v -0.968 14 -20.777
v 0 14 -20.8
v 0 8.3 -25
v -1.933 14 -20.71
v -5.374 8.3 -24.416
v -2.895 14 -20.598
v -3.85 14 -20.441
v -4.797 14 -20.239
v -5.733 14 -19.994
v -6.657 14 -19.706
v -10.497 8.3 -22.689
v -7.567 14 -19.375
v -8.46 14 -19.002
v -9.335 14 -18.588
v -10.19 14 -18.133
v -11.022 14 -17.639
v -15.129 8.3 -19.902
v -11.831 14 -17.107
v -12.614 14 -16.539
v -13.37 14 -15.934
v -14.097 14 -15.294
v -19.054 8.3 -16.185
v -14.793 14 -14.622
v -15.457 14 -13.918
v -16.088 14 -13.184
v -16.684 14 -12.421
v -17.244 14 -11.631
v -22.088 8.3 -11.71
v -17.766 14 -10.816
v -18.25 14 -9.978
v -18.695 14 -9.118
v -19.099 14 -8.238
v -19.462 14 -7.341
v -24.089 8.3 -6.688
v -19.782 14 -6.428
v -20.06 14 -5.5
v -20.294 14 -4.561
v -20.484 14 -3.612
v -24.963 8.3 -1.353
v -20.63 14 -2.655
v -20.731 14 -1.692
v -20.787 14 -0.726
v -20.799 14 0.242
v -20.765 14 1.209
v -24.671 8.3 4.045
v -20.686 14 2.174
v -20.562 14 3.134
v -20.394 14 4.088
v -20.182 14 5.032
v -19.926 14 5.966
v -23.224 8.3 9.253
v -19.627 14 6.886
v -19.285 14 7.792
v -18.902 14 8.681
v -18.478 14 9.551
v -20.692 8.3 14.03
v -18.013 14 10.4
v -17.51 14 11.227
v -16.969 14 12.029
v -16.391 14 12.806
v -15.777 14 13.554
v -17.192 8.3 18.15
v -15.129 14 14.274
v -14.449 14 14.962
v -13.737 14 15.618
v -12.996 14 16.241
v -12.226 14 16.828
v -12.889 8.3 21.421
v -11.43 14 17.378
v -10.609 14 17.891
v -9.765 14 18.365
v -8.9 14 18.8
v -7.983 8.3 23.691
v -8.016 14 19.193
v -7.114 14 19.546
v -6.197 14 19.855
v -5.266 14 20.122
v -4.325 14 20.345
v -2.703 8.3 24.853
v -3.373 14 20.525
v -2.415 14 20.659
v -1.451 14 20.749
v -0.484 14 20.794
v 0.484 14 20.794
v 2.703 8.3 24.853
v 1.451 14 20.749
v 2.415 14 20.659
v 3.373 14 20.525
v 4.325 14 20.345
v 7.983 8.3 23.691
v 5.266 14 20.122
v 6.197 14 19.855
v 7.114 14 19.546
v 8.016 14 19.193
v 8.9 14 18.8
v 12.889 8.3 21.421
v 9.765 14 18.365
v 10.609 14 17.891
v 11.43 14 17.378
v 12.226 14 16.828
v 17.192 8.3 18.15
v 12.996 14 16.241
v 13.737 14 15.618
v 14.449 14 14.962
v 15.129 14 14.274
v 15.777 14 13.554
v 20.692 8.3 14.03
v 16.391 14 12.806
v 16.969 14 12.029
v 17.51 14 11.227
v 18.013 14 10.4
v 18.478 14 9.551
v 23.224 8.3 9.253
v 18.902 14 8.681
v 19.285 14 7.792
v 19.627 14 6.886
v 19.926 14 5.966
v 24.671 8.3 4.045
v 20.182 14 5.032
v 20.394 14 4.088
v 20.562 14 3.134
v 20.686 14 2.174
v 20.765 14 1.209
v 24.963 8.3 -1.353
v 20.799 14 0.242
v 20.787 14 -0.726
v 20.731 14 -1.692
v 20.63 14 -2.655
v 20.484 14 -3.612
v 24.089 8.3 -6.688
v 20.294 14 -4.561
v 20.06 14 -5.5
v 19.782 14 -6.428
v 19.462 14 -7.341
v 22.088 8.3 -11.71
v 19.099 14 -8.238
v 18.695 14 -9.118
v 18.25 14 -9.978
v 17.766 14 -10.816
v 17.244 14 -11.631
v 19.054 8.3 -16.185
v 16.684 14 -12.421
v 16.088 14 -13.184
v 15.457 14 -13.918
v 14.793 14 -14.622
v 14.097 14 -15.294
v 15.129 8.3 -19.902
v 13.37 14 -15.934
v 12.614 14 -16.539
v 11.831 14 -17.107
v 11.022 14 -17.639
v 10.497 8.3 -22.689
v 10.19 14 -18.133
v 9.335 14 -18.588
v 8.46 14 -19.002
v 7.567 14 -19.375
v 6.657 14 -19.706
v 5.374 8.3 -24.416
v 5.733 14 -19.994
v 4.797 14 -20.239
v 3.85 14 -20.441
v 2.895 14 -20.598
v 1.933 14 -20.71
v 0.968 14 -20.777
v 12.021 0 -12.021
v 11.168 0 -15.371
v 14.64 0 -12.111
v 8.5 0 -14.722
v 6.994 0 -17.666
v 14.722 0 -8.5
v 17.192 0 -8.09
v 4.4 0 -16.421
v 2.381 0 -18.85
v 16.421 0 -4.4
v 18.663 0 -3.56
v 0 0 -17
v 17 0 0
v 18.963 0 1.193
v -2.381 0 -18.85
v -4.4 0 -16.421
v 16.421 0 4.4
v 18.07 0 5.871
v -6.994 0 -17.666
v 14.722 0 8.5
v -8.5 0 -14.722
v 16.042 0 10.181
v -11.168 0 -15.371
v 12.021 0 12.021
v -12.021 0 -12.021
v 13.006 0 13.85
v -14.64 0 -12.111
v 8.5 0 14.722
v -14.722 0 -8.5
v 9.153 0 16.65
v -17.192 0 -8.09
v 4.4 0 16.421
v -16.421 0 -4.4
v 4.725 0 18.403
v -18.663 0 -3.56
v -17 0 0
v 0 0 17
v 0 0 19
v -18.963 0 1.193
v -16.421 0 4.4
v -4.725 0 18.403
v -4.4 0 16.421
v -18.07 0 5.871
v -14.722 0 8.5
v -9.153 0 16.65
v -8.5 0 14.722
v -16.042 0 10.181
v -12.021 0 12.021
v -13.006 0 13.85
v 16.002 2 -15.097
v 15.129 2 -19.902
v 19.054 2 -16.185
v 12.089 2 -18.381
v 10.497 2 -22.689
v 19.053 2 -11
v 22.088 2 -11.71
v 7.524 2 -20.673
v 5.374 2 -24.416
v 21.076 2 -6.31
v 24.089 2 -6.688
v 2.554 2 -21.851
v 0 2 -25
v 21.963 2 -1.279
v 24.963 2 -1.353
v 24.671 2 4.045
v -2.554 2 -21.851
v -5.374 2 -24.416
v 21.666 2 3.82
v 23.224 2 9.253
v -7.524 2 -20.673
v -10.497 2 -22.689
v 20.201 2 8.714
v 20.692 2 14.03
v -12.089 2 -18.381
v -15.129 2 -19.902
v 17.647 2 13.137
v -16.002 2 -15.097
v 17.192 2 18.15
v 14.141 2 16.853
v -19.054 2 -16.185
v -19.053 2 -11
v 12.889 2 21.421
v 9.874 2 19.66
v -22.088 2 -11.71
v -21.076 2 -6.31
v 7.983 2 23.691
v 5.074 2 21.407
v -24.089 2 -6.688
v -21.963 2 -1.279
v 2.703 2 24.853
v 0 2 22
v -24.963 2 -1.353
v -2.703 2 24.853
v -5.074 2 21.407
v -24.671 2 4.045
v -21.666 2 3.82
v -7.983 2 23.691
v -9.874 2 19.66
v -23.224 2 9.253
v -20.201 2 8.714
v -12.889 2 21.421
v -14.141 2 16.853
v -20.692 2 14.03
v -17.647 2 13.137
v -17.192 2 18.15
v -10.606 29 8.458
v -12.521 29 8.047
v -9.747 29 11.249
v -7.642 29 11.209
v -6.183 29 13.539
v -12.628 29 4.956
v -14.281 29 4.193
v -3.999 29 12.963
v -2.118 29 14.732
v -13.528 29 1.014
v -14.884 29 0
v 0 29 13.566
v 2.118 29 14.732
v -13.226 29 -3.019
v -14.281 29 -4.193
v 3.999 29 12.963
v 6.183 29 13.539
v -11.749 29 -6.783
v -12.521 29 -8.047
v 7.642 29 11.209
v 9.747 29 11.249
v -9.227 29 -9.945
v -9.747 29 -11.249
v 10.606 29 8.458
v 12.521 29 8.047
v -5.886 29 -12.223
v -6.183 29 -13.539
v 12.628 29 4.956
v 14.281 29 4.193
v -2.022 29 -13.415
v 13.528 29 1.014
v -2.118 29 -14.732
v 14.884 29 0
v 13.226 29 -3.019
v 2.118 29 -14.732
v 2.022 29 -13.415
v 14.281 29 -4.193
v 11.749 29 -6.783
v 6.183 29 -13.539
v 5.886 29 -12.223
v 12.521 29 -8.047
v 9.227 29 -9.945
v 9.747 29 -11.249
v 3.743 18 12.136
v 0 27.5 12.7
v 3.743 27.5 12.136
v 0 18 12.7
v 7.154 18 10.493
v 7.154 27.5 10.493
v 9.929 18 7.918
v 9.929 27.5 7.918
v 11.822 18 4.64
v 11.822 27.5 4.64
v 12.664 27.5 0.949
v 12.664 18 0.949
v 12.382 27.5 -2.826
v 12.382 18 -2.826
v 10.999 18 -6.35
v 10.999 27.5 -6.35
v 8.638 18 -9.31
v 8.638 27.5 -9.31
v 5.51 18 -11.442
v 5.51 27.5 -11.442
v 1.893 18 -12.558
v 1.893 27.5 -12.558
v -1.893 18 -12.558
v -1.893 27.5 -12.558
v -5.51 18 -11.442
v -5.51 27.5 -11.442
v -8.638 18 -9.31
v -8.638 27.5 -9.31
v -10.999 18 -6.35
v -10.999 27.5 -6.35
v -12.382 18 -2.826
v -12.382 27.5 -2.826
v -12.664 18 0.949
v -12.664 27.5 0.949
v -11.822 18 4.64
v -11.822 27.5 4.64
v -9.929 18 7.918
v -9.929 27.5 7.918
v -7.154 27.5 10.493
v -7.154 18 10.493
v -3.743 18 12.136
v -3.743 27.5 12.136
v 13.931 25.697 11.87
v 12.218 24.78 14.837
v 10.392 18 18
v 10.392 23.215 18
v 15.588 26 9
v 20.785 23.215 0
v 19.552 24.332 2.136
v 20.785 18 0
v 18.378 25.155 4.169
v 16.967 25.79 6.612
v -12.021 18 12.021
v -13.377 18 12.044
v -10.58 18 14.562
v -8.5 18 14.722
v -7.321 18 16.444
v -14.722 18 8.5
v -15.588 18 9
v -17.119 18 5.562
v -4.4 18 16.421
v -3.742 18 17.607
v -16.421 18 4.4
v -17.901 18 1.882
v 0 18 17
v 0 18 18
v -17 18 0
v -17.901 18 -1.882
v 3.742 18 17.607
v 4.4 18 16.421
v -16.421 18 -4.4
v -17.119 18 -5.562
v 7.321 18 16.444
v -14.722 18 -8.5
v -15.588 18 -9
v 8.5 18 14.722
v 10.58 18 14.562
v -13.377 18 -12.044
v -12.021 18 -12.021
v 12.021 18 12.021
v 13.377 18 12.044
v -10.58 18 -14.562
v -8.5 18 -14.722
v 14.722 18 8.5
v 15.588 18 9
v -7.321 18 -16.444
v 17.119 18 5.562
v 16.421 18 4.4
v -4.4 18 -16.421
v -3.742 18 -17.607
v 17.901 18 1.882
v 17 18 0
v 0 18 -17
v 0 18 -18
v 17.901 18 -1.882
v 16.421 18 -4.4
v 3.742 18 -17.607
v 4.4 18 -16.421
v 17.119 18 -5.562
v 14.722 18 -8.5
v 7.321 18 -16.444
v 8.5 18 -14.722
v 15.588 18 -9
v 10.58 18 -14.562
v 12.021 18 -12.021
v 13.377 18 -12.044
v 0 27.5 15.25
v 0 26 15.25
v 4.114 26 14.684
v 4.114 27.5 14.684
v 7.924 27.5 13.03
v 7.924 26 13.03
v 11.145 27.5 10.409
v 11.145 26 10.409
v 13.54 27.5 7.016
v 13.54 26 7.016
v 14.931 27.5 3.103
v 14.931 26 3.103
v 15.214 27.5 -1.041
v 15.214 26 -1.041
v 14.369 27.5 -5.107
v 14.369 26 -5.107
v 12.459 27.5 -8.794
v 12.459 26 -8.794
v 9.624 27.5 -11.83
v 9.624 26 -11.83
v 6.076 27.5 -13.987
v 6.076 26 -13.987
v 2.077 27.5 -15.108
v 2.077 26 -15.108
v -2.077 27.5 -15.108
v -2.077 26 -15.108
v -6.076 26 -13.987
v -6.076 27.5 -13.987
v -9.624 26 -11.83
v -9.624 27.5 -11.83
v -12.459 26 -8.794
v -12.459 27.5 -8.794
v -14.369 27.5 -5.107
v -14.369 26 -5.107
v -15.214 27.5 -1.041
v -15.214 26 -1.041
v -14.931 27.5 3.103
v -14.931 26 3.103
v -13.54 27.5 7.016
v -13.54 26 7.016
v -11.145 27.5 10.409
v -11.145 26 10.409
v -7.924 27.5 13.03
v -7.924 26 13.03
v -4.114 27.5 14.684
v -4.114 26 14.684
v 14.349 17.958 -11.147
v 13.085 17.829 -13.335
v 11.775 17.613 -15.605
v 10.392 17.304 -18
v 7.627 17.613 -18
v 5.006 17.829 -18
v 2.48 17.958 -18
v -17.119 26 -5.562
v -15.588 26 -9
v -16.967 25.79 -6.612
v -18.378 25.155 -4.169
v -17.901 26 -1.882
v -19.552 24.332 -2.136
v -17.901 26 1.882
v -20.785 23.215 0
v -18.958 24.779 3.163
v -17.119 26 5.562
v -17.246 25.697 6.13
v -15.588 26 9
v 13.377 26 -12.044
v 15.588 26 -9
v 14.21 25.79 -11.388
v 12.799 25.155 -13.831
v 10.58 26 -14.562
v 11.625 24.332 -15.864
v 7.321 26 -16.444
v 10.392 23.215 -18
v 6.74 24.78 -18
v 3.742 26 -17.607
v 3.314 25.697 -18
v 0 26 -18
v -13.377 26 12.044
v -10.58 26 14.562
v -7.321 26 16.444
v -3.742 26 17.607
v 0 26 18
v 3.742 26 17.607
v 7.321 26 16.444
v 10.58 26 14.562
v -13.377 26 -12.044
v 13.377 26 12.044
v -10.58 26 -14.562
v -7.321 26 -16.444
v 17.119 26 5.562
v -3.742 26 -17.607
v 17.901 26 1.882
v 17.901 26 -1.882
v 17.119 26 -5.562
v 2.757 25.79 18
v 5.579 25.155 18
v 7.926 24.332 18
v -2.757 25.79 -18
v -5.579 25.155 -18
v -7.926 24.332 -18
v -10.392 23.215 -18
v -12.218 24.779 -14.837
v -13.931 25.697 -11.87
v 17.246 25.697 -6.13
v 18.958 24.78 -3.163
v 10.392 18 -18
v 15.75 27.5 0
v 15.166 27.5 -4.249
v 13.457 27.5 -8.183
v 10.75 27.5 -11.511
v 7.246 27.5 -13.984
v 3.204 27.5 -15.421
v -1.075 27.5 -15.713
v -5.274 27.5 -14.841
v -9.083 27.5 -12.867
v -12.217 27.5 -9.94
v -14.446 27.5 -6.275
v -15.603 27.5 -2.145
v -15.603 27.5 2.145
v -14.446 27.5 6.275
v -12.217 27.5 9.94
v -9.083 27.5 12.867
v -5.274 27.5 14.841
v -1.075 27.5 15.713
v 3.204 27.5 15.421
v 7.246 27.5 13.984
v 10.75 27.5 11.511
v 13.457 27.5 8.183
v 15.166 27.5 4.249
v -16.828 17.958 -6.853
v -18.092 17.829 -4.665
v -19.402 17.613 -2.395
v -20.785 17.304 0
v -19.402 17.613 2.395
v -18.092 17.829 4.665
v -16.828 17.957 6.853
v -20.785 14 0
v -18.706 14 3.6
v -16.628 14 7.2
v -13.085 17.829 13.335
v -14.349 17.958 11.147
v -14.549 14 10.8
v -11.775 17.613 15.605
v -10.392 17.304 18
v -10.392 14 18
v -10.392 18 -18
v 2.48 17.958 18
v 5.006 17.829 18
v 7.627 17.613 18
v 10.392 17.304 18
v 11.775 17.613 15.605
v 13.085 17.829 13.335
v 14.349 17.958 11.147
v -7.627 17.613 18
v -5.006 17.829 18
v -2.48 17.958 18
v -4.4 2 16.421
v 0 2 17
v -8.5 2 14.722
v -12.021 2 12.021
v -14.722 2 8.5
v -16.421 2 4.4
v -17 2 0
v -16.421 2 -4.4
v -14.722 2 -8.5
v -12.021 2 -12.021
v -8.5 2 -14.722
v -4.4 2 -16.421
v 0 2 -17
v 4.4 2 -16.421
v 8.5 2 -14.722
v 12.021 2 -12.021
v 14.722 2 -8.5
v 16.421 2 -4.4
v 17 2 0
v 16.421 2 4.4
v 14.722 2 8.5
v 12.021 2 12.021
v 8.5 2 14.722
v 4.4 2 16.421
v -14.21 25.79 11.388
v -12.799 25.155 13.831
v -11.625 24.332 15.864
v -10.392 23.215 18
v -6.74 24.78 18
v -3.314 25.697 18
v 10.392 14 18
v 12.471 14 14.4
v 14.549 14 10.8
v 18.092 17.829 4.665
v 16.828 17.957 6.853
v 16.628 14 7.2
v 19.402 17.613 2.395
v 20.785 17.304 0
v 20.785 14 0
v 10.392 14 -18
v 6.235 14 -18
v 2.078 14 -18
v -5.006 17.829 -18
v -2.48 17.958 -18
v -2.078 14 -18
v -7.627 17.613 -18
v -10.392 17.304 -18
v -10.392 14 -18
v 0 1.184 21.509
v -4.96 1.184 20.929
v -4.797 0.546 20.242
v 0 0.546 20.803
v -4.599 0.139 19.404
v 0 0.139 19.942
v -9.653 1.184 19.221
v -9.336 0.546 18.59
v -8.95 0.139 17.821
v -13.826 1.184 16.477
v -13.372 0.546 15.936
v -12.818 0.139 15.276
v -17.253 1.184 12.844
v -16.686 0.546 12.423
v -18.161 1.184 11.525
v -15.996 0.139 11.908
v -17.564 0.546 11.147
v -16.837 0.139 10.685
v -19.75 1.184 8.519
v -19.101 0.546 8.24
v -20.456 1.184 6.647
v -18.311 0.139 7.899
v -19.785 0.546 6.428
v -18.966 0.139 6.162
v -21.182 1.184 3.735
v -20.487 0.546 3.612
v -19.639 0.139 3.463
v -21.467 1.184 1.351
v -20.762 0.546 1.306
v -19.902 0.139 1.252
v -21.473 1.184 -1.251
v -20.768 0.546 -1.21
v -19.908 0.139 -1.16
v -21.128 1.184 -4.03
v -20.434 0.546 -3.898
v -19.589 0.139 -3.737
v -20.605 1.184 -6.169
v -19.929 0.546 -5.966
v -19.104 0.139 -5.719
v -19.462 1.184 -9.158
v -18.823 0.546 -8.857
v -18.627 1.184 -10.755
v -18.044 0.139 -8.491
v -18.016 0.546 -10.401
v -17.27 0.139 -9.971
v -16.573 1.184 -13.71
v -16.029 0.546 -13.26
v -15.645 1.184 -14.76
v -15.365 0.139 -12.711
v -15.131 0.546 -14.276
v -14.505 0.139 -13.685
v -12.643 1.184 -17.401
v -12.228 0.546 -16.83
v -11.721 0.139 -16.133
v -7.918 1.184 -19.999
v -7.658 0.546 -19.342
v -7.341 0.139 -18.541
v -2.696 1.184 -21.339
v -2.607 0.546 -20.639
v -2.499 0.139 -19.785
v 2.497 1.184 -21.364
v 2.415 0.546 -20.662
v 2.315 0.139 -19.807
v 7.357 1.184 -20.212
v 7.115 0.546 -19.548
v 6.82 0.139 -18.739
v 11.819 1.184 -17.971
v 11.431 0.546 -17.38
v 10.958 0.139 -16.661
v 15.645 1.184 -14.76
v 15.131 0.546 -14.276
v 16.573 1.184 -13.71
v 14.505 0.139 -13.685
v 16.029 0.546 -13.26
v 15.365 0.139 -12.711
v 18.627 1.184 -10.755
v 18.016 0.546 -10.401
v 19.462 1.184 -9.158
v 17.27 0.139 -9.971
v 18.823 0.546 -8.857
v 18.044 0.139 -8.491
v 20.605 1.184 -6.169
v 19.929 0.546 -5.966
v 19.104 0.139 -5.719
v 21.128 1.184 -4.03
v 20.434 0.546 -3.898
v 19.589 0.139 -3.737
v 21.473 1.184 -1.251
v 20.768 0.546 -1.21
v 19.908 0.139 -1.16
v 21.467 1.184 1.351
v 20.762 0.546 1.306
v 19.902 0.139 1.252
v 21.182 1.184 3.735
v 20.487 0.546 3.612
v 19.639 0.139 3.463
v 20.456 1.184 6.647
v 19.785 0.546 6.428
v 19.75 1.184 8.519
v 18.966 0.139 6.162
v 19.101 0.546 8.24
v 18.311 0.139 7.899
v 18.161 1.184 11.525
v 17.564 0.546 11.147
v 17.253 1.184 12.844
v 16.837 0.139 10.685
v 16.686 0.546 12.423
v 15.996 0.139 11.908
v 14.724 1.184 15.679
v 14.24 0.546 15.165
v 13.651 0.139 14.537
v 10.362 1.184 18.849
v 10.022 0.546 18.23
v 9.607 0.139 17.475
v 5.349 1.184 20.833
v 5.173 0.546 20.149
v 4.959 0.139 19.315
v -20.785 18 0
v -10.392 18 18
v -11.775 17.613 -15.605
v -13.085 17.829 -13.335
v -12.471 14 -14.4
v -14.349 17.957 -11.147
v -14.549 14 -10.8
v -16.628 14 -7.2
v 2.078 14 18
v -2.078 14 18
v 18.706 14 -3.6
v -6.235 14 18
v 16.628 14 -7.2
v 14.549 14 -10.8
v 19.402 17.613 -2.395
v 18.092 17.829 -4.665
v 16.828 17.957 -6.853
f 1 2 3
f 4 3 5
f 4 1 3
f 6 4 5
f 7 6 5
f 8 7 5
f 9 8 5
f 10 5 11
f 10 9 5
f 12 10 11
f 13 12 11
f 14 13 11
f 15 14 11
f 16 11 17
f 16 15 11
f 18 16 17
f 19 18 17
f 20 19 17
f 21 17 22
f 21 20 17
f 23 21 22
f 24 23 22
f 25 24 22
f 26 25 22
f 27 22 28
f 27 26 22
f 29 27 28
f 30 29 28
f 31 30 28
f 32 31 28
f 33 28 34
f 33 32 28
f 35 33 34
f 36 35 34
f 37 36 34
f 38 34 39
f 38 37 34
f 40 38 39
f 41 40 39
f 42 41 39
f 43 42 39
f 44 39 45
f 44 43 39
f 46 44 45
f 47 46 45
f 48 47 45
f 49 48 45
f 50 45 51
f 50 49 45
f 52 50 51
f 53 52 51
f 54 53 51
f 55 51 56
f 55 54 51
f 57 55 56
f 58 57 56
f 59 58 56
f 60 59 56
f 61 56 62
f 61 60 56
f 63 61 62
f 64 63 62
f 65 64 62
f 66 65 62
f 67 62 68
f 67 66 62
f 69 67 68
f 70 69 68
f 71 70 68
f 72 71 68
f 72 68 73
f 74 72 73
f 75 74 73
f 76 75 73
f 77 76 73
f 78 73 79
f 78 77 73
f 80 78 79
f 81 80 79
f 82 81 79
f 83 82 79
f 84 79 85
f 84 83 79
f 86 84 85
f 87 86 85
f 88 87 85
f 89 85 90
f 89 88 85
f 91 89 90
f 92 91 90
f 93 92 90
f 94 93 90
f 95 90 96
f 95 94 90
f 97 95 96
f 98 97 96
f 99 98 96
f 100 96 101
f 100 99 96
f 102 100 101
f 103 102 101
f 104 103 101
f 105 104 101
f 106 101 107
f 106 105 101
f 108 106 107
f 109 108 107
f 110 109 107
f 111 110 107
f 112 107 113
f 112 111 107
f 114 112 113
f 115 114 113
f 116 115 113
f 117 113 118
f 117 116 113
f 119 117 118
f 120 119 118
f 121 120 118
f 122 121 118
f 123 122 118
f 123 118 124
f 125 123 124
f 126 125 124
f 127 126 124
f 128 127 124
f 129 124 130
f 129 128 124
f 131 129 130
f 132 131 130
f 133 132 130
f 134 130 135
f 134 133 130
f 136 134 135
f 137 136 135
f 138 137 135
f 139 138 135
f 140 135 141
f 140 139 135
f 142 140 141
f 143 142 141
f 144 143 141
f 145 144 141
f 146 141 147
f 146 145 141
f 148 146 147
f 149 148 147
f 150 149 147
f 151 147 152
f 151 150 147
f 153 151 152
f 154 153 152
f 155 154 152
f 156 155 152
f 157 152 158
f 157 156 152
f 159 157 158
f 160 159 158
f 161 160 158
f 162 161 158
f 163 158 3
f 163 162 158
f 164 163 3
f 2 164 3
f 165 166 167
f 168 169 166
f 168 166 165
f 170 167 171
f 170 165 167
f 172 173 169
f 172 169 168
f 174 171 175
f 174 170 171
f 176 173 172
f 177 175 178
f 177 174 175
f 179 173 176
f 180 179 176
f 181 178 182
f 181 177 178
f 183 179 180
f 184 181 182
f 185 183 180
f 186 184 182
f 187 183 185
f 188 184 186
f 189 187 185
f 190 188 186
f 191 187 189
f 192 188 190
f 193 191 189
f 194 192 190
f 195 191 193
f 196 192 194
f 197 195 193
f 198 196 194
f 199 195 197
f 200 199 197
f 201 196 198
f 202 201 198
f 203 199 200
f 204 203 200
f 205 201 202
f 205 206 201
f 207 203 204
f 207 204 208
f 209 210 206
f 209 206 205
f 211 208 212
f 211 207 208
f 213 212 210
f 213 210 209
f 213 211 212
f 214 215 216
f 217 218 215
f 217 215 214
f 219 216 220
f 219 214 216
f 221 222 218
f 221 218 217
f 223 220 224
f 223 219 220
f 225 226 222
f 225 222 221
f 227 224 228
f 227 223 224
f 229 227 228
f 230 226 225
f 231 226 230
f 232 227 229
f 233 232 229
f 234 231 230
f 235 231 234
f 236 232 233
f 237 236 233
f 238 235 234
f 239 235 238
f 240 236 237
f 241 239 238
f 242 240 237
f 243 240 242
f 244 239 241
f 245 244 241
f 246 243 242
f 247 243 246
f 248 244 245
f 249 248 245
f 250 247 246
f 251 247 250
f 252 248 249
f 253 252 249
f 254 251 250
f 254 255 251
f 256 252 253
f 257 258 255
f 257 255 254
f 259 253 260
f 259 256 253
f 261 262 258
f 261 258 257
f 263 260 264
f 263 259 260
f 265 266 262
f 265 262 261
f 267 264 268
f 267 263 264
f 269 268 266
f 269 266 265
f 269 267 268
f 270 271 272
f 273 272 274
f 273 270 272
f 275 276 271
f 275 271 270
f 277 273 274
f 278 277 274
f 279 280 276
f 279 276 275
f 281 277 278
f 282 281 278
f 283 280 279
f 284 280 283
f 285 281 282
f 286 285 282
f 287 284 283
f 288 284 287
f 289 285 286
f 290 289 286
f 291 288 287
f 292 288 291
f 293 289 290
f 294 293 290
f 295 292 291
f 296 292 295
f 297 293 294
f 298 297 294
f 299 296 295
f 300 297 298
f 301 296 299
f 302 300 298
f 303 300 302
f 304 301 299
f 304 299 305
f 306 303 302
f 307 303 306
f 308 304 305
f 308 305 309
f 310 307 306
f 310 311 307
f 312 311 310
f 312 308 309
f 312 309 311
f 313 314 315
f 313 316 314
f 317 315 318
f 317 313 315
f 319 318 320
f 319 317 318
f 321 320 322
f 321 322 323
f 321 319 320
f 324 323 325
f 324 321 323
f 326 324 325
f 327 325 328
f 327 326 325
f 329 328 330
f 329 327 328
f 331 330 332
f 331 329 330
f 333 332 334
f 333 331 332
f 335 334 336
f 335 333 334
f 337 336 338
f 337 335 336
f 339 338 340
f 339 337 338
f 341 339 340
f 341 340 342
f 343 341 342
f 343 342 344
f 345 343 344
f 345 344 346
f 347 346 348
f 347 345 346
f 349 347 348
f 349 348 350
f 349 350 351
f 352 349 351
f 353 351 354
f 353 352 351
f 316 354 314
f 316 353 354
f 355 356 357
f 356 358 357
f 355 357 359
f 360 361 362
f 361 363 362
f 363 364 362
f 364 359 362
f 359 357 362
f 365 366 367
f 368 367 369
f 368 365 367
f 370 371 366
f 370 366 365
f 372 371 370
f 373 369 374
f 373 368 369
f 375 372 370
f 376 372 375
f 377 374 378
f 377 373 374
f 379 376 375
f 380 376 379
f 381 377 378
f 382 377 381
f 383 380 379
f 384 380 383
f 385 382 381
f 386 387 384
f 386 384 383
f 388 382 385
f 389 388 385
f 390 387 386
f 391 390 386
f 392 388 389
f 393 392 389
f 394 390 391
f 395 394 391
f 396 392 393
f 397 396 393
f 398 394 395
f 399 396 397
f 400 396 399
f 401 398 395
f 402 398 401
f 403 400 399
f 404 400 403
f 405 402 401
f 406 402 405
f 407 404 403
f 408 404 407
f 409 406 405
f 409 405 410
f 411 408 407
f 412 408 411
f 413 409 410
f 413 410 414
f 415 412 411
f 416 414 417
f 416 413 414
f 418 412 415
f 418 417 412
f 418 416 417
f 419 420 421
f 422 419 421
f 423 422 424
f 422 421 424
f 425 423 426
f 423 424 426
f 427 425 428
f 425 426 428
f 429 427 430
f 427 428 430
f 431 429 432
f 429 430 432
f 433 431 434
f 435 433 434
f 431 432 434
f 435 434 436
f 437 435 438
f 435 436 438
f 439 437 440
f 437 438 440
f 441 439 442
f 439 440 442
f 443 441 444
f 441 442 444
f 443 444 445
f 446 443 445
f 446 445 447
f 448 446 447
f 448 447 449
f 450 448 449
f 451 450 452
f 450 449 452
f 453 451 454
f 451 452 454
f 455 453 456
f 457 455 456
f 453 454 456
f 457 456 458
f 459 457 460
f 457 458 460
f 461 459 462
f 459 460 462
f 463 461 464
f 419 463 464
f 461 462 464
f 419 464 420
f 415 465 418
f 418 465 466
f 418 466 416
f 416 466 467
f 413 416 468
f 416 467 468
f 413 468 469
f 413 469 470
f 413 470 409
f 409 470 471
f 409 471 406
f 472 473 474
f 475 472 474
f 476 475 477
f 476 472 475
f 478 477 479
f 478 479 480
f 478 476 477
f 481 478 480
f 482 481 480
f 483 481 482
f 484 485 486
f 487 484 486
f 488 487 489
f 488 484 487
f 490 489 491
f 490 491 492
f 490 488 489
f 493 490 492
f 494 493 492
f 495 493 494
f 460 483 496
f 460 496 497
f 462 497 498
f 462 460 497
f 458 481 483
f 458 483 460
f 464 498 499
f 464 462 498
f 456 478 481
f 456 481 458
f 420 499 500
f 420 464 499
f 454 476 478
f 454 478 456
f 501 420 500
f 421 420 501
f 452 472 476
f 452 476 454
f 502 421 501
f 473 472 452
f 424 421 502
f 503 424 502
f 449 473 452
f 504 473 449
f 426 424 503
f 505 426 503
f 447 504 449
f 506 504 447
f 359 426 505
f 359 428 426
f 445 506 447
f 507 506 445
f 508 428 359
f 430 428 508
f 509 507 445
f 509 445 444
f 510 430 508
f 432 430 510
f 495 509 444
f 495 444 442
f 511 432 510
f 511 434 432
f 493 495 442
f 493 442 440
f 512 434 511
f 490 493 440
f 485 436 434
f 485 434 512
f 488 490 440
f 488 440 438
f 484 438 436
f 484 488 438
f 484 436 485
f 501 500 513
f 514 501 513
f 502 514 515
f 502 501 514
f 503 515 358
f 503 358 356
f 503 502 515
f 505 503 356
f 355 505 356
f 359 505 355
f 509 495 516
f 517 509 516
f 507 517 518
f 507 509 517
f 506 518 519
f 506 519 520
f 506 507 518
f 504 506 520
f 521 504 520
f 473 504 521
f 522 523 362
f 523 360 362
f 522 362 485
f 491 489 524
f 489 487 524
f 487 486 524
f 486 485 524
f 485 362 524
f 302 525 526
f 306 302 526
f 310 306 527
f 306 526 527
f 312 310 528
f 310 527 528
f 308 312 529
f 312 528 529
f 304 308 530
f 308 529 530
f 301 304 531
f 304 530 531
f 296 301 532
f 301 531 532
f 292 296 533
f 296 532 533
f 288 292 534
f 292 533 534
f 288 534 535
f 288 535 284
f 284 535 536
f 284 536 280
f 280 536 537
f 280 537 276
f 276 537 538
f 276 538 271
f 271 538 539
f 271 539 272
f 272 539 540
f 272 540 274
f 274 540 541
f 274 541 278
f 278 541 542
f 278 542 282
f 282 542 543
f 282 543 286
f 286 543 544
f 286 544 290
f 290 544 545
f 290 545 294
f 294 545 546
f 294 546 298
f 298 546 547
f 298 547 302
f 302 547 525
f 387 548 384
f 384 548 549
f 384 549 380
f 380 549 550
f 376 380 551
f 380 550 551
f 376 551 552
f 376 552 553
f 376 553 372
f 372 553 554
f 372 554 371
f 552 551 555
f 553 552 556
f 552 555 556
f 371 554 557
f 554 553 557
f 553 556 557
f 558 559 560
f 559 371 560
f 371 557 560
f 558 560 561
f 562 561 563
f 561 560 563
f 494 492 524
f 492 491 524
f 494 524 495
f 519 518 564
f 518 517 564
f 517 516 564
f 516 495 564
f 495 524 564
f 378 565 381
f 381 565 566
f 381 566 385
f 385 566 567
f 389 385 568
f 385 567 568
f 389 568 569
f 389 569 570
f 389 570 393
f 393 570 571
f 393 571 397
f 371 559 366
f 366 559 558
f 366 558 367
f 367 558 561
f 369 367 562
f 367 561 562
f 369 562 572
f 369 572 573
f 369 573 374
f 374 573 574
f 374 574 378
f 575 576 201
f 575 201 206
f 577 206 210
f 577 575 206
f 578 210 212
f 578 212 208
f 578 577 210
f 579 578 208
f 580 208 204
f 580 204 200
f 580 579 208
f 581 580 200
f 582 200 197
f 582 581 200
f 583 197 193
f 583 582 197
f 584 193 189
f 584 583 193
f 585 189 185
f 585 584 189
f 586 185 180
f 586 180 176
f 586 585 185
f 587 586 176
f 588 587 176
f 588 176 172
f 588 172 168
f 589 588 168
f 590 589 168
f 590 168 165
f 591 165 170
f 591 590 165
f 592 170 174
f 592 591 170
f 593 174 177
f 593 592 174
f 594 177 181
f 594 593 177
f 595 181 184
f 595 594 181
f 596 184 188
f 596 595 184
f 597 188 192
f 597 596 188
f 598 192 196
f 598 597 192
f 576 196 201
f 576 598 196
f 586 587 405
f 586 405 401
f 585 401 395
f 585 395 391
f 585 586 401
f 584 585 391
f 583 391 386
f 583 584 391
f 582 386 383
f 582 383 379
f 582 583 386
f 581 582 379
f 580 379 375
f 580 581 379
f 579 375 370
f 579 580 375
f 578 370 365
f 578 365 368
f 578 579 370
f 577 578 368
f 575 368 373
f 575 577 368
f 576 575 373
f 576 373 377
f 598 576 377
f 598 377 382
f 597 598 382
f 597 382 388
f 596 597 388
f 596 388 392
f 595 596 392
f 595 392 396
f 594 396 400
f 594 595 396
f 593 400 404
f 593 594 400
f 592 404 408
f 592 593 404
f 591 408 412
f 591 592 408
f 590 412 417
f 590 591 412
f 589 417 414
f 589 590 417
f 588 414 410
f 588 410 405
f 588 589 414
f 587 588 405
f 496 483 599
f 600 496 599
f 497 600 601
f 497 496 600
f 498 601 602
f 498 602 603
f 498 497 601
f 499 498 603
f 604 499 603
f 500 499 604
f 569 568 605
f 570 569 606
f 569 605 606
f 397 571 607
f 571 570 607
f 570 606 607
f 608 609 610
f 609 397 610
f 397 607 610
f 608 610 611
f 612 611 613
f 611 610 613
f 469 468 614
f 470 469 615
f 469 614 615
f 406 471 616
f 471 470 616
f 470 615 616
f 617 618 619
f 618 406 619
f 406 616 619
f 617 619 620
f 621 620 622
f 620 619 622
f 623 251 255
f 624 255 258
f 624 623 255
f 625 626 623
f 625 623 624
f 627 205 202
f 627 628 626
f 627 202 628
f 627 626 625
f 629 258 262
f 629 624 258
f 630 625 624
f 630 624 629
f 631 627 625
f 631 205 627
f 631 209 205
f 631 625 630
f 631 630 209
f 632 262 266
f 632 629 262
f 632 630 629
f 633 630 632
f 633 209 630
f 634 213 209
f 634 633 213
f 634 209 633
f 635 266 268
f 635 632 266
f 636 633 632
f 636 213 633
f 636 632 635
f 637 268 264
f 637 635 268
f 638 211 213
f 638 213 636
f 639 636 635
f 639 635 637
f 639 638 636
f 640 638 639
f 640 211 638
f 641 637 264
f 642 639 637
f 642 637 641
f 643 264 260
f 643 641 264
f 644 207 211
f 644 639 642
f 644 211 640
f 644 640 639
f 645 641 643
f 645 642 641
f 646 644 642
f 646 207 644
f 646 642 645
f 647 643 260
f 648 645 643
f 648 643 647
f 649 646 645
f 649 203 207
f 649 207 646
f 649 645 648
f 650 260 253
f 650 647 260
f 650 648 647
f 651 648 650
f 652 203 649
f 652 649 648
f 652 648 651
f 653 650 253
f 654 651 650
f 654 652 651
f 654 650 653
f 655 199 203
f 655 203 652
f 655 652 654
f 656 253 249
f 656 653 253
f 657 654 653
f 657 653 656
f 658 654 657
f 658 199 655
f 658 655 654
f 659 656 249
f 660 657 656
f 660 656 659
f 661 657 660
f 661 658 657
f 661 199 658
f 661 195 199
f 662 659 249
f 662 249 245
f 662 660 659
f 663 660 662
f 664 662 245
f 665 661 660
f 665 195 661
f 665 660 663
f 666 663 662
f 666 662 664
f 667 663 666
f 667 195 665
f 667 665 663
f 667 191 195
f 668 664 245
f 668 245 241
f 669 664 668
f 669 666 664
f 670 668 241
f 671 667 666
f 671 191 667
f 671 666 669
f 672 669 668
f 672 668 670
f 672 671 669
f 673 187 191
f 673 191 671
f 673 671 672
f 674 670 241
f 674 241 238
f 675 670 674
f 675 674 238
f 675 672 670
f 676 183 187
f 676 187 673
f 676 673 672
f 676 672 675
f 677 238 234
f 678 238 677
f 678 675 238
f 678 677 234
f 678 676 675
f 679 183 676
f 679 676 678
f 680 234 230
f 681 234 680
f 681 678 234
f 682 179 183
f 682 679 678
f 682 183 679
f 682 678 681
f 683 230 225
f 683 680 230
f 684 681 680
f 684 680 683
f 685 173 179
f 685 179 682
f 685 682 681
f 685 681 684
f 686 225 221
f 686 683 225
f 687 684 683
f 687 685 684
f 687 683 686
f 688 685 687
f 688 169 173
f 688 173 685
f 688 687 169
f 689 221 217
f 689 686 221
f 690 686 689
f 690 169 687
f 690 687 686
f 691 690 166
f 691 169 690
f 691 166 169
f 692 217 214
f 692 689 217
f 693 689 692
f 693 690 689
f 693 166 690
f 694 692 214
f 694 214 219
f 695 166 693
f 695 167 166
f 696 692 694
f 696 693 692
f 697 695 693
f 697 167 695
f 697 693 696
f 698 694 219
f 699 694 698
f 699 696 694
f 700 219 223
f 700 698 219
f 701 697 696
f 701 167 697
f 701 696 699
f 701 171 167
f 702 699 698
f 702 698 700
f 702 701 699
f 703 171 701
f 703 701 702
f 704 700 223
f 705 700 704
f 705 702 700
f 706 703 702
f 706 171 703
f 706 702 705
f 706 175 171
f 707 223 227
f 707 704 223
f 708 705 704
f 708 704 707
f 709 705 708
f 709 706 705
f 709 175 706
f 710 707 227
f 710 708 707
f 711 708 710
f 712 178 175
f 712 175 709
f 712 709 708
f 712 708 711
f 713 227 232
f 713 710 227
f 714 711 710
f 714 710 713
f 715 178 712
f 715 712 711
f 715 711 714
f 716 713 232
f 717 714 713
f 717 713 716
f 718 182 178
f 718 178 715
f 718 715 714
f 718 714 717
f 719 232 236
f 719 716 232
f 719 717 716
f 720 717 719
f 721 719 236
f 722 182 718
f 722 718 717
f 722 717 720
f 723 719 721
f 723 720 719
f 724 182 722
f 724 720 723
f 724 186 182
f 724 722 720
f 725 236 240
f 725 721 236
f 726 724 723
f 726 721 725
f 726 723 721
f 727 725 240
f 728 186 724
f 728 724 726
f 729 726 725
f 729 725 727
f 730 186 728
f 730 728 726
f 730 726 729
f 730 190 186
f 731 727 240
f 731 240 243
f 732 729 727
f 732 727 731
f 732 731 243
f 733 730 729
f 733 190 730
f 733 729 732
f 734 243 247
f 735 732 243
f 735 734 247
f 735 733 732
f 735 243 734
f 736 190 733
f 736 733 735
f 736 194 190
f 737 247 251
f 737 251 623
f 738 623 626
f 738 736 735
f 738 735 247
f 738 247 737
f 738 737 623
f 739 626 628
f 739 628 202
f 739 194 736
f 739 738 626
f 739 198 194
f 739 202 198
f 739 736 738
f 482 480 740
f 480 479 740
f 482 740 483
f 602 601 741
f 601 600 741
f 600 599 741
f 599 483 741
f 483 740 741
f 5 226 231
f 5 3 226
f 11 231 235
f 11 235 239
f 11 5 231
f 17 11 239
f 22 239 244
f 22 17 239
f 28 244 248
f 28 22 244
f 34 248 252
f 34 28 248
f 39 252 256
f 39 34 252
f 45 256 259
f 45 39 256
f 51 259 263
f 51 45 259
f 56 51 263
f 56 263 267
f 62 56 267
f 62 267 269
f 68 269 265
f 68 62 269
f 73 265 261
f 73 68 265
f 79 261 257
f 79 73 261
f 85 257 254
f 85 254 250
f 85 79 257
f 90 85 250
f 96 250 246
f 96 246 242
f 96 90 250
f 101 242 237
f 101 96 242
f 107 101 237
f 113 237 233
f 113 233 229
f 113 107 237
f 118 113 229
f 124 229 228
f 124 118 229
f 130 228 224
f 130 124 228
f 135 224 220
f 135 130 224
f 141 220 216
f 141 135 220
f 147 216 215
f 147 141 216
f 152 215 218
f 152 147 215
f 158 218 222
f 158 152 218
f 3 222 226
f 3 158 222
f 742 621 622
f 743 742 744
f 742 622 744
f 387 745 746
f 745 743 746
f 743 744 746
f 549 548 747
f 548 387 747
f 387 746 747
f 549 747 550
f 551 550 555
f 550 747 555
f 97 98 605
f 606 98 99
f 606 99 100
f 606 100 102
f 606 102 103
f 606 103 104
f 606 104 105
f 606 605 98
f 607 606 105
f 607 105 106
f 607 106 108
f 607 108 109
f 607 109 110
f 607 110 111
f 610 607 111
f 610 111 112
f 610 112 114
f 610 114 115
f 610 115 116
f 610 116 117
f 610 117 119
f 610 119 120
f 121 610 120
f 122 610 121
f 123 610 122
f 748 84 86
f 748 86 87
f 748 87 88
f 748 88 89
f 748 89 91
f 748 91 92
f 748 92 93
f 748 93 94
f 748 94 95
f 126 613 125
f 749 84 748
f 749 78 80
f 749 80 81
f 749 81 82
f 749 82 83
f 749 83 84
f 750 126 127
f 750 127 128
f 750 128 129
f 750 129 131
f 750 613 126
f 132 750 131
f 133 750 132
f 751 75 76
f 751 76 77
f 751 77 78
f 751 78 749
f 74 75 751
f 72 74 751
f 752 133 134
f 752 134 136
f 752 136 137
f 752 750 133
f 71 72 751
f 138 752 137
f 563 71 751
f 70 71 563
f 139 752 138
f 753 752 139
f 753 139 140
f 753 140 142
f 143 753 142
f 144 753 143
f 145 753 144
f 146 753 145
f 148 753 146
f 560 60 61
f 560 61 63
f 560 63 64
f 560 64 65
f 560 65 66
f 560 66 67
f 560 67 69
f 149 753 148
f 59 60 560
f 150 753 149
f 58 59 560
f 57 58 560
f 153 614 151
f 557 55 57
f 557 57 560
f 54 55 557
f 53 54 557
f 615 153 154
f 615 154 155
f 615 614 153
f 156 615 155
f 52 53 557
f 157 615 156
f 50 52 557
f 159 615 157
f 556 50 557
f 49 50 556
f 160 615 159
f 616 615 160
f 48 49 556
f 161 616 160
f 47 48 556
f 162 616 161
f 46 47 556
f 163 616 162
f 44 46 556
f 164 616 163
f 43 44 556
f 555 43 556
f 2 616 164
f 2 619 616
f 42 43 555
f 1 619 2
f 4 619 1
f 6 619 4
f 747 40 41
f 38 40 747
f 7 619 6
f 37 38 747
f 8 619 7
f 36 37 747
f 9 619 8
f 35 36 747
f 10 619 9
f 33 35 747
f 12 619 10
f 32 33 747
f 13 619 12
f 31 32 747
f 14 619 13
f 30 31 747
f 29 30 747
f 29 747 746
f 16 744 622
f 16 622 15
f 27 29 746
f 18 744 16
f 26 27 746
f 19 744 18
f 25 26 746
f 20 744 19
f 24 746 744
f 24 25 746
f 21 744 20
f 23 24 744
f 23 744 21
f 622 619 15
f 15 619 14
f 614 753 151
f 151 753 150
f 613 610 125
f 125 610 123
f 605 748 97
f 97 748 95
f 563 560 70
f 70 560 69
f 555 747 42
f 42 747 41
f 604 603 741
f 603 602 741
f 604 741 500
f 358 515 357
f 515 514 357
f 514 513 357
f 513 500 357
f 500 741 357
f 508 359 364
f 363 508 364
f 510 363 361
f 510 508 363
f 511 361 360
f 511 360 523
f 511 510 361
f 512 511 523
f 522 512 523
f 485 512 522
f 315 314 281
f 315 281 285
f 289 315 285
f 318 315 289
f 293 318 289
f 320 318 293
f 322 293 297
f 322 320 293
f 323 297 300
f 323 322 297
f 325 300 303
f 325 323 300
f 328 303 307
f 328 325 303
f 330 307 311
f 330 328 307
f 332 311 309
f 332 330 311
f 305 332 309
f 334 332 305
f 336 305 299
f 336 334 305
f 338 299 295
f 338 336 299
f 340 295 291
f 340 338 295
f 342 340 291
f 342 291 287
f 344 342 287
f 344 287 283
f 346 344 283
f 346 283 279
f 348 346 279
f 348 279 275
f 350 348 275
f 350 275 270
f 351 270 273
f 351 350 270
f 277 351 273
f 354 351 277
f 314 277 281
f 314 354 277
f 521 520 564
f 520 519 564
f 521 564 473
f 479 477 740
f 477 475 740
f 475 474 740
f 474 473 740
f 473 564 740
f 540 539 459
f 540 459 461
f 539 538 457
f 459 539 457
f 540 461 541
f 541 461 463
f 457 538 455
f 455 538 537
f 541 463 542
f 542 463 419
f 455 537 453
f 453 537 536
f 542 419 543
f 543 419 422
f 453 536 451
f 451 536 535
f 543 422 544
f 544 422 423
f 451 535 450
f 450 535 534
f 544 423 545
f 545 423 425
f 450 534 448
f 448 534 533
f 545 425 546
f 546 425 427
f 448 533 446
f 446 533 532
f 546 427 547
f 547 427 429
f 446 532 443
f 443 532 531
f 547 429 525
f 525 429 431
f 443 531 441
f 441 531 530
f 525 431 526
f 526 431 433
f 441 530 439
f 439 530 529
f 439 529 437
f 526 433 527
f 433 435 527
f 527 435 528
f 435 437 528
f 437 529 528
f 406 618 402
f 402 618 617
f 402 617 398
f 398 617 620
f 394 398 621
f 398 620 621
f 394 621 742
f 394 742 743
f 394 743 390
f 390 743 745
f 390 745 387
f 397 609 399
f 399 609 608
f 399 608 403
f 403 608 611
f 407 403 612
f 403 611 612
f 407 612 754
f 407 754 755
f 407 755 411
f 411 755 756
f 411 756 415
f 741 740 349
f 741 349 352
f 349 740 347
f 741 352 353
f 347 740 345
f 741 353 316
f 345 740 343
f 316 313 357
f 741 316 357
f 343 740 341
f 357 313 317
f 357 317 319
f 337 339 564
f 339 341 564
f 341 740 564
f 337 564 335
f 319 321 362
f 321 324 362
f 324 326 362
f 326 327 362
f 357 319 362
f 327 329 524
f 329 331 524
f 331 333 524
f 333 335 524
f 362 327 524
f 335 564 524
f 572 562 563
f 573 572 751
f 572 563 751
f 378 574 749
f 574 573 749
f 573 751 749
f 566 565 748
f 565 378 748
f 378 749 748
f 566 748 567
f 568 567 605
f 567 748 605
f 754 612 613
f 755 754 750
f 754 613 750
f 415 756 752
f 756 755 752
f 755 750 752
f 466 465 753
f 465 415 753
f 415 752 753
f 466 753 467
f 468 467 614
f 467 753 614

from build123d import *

# Parameters (mm, degrees)
SKETCH2_R      = 17
EXTRUDE1_DEPTH = 4
SKETCH5_R      = 12.7
EXTRUDE2_DEPTH = 8
SKETCH7_R      = 15.25
SKETCH7_R_2    = 12.7
EXTRUDE3_DEPTH = 1.5
SKETCH8_R      = 15.75
SKETCH8_R_2    = 12.7
EXTRUDE4_DEPTH = 1.5
EXTRUDE4_DRAFT = 30


with BuildPart() as part:
    # Sketch1 → Revolve1 (revolve)
    with BuildSketch(Plane(origin=(0, 0, 0), x_dir=(0, 0, -1), z_dir=(1, 0, 0))):
        Polygon((17, 2), (25, 2), (25, 8.3), (20.8, 14), (17, 14), align=None)
    revolve(axis=Axis((0, 2, 0), (0, 1, 0)))

    # Sketch2 → Extrude1 (add)
    with BuildSketch(Plane(origin=(0, 14, 0), x_dir=(1, 0, 0), z_dir=(0, 1, 0))):
        Polygon((10.392304845, 18), (-10.392304845, 18), (-20.784609691, 0), (-10.392304845, -18), (10.392304845, -18), (20.784609691, 0), align=None)
        with Locations(Location((0, 0, 0), (0, 0, 90))):  # turned: the seam where the file's is
            Circle(SKETCH2_R, mode=Mode.SUBTRACT)
    extrude(amount=EXTRUDE1_DEPTH)

    # SurfaceCut1: cut with a surface, the side it looks to stays
    # Surface-Revolve1: a surface, the sketch's curves turned about an axis
    with BuildLine(Plane(origin=(0, 0, 0), x_dir=(0, 0, -1), z_dir=(1, 0, 0)), mode=Mode.PRIVATE) as surface_revolve1_1_path:
        Line((18, 18), (24, 16.5))
    surface_revolve1_1 = Shell.revolve(surface_revolve1_1_path.wire(), 360, Axis((0, 0, 0), (0, 1, 0)))
    split(bisect_by=surface_revolve1_1, keep=Keep.TOP)

    # Sketch9 → Revolve2 (revolve)
    with BuildSketch(Plane(origin=(0, 0, 0), x_dir=(0, 0, -1), z_dir=(1, 0, 0)), mode=Mode.PRIVATE) as revolve2_sk:
        with BuildLine():
            Line((19, 0), (17, 0))
            Line((17, 0), (17, 2))
            Line((17, 2), (22, 2))
            ThreePointArc((22, 2), (20.802775638, 0.545836543), (19, 0))
        make_face()
    revolve(revolve2_sk.sketch.rotate(Axis((0, 0, 0), (0, -1, 0)), 180), axis=Axis((0, 0, 0), (0, -1, 0)))  # turned: the seam where the file's is


with BuildPart() as body_2:
    # Sketch5 → Extrude2 (new body)
    with BuildSketch(Plane(origin=(0, 18, 0), x_dir=(1, 0, 0), z_dir=(0, 1, 0))):
        Polygon((-20.784609691, 0), (-10.392304845, -18), (10.392304845, -18), (20.784609691, 0), (10.392304845, 18), (-10.392304845, 18), align=None)
        with Locations(Location((0, 0, 0), (0, 0, 270))):  # turned: the seam where the file's is
            Circle(SKETCH5_R, mode=Mode.SUBTRACT)
    extrude(amount=EXTRUDE2_DEPTH)

    # SurfaceCut2: cut with a surface, the side behind it stays
    # Surface-Revolve2: a surface, the sketch's curves turned about an axis
    with BuildLine(Plane(origin=(0, 0, 0), x_dir=(0, 0, -1), z_dir=(1, 0, 0)), mode=Mode.PRIVATE) as surface_revolve2_2_path:
        Line((17, 16), (21, 16.5))
        Line((21, 16.5), (21, 23))
        Line((21, 23), (18, 26))
    surface_revolve2_2 = Shell.revolve(surface_revolve2_2_path.wire(), 360, Axis((0, 0, 0), (0, 1, 0)))
    split(bisect_by=surface_revolve2_2, keep=Keep.BOTTOM)

    # Sketch7 → Extrude3 (add)
    with BuildSketch(Plane(origin=(0, 26, 0), x_dir=(1, 0, 0), z_dir=(0, 1, 0))):
        with Locations(Location((0, 0, 0), (0, 0, 270))):  # turned: the seam where the file's is
            Circle(SKETCH7_R)
        with Locations(Location((0, 0, 0), (0, 0, 270))):  # turned: the seam where the file's is
            Circle(SKETCH7_R_2, mode=Mode.SUBTRACT)
    extrude(amount=EXTRUDE3_DEPTH)


with BuildPart() as extrude4_tool:
    # Sketch8 → Extrude4 (with draft: the straight prism first)
    with BuildSketch(Plane(origin=(0, 27.5, 0), x_dir=(1, 0, 0), z_dir=(0, 1, 0))):
        Circle(SKETCH8_R)
        with Locations(Location((0, 0, 0), (0, 0, 270))):  # turned: the seam where the file's is
            Circle(SKETCH8_R_2, mode=Mode.SUBTRACT)
    extrude(amount=EXTRUDE4_DEPTH)
    # Extrude4: the draft: its side faces are tilted about the plane it starts from
    extrude4_sides = [extrude4_tool.faces().sort_by_distance(p)[0] for p in [
        (-15.75, 28.25, 0),
        (0, 28.25, -12.7),
    ]]
    draft(extrude4_sides, Plane(origin=(0, 27.5, 0), x_dir=(1, 0, 0), z_dir=(0, 1, 0)), EXTRUDE4_DRAFT)


with BuildPart() as body_2_1:
    add(body_2.part)

    # Extrude4: add extrude4_tool
    add(extrude4_tool.part)


solid = Compound([part.part, body_2_1.part])
